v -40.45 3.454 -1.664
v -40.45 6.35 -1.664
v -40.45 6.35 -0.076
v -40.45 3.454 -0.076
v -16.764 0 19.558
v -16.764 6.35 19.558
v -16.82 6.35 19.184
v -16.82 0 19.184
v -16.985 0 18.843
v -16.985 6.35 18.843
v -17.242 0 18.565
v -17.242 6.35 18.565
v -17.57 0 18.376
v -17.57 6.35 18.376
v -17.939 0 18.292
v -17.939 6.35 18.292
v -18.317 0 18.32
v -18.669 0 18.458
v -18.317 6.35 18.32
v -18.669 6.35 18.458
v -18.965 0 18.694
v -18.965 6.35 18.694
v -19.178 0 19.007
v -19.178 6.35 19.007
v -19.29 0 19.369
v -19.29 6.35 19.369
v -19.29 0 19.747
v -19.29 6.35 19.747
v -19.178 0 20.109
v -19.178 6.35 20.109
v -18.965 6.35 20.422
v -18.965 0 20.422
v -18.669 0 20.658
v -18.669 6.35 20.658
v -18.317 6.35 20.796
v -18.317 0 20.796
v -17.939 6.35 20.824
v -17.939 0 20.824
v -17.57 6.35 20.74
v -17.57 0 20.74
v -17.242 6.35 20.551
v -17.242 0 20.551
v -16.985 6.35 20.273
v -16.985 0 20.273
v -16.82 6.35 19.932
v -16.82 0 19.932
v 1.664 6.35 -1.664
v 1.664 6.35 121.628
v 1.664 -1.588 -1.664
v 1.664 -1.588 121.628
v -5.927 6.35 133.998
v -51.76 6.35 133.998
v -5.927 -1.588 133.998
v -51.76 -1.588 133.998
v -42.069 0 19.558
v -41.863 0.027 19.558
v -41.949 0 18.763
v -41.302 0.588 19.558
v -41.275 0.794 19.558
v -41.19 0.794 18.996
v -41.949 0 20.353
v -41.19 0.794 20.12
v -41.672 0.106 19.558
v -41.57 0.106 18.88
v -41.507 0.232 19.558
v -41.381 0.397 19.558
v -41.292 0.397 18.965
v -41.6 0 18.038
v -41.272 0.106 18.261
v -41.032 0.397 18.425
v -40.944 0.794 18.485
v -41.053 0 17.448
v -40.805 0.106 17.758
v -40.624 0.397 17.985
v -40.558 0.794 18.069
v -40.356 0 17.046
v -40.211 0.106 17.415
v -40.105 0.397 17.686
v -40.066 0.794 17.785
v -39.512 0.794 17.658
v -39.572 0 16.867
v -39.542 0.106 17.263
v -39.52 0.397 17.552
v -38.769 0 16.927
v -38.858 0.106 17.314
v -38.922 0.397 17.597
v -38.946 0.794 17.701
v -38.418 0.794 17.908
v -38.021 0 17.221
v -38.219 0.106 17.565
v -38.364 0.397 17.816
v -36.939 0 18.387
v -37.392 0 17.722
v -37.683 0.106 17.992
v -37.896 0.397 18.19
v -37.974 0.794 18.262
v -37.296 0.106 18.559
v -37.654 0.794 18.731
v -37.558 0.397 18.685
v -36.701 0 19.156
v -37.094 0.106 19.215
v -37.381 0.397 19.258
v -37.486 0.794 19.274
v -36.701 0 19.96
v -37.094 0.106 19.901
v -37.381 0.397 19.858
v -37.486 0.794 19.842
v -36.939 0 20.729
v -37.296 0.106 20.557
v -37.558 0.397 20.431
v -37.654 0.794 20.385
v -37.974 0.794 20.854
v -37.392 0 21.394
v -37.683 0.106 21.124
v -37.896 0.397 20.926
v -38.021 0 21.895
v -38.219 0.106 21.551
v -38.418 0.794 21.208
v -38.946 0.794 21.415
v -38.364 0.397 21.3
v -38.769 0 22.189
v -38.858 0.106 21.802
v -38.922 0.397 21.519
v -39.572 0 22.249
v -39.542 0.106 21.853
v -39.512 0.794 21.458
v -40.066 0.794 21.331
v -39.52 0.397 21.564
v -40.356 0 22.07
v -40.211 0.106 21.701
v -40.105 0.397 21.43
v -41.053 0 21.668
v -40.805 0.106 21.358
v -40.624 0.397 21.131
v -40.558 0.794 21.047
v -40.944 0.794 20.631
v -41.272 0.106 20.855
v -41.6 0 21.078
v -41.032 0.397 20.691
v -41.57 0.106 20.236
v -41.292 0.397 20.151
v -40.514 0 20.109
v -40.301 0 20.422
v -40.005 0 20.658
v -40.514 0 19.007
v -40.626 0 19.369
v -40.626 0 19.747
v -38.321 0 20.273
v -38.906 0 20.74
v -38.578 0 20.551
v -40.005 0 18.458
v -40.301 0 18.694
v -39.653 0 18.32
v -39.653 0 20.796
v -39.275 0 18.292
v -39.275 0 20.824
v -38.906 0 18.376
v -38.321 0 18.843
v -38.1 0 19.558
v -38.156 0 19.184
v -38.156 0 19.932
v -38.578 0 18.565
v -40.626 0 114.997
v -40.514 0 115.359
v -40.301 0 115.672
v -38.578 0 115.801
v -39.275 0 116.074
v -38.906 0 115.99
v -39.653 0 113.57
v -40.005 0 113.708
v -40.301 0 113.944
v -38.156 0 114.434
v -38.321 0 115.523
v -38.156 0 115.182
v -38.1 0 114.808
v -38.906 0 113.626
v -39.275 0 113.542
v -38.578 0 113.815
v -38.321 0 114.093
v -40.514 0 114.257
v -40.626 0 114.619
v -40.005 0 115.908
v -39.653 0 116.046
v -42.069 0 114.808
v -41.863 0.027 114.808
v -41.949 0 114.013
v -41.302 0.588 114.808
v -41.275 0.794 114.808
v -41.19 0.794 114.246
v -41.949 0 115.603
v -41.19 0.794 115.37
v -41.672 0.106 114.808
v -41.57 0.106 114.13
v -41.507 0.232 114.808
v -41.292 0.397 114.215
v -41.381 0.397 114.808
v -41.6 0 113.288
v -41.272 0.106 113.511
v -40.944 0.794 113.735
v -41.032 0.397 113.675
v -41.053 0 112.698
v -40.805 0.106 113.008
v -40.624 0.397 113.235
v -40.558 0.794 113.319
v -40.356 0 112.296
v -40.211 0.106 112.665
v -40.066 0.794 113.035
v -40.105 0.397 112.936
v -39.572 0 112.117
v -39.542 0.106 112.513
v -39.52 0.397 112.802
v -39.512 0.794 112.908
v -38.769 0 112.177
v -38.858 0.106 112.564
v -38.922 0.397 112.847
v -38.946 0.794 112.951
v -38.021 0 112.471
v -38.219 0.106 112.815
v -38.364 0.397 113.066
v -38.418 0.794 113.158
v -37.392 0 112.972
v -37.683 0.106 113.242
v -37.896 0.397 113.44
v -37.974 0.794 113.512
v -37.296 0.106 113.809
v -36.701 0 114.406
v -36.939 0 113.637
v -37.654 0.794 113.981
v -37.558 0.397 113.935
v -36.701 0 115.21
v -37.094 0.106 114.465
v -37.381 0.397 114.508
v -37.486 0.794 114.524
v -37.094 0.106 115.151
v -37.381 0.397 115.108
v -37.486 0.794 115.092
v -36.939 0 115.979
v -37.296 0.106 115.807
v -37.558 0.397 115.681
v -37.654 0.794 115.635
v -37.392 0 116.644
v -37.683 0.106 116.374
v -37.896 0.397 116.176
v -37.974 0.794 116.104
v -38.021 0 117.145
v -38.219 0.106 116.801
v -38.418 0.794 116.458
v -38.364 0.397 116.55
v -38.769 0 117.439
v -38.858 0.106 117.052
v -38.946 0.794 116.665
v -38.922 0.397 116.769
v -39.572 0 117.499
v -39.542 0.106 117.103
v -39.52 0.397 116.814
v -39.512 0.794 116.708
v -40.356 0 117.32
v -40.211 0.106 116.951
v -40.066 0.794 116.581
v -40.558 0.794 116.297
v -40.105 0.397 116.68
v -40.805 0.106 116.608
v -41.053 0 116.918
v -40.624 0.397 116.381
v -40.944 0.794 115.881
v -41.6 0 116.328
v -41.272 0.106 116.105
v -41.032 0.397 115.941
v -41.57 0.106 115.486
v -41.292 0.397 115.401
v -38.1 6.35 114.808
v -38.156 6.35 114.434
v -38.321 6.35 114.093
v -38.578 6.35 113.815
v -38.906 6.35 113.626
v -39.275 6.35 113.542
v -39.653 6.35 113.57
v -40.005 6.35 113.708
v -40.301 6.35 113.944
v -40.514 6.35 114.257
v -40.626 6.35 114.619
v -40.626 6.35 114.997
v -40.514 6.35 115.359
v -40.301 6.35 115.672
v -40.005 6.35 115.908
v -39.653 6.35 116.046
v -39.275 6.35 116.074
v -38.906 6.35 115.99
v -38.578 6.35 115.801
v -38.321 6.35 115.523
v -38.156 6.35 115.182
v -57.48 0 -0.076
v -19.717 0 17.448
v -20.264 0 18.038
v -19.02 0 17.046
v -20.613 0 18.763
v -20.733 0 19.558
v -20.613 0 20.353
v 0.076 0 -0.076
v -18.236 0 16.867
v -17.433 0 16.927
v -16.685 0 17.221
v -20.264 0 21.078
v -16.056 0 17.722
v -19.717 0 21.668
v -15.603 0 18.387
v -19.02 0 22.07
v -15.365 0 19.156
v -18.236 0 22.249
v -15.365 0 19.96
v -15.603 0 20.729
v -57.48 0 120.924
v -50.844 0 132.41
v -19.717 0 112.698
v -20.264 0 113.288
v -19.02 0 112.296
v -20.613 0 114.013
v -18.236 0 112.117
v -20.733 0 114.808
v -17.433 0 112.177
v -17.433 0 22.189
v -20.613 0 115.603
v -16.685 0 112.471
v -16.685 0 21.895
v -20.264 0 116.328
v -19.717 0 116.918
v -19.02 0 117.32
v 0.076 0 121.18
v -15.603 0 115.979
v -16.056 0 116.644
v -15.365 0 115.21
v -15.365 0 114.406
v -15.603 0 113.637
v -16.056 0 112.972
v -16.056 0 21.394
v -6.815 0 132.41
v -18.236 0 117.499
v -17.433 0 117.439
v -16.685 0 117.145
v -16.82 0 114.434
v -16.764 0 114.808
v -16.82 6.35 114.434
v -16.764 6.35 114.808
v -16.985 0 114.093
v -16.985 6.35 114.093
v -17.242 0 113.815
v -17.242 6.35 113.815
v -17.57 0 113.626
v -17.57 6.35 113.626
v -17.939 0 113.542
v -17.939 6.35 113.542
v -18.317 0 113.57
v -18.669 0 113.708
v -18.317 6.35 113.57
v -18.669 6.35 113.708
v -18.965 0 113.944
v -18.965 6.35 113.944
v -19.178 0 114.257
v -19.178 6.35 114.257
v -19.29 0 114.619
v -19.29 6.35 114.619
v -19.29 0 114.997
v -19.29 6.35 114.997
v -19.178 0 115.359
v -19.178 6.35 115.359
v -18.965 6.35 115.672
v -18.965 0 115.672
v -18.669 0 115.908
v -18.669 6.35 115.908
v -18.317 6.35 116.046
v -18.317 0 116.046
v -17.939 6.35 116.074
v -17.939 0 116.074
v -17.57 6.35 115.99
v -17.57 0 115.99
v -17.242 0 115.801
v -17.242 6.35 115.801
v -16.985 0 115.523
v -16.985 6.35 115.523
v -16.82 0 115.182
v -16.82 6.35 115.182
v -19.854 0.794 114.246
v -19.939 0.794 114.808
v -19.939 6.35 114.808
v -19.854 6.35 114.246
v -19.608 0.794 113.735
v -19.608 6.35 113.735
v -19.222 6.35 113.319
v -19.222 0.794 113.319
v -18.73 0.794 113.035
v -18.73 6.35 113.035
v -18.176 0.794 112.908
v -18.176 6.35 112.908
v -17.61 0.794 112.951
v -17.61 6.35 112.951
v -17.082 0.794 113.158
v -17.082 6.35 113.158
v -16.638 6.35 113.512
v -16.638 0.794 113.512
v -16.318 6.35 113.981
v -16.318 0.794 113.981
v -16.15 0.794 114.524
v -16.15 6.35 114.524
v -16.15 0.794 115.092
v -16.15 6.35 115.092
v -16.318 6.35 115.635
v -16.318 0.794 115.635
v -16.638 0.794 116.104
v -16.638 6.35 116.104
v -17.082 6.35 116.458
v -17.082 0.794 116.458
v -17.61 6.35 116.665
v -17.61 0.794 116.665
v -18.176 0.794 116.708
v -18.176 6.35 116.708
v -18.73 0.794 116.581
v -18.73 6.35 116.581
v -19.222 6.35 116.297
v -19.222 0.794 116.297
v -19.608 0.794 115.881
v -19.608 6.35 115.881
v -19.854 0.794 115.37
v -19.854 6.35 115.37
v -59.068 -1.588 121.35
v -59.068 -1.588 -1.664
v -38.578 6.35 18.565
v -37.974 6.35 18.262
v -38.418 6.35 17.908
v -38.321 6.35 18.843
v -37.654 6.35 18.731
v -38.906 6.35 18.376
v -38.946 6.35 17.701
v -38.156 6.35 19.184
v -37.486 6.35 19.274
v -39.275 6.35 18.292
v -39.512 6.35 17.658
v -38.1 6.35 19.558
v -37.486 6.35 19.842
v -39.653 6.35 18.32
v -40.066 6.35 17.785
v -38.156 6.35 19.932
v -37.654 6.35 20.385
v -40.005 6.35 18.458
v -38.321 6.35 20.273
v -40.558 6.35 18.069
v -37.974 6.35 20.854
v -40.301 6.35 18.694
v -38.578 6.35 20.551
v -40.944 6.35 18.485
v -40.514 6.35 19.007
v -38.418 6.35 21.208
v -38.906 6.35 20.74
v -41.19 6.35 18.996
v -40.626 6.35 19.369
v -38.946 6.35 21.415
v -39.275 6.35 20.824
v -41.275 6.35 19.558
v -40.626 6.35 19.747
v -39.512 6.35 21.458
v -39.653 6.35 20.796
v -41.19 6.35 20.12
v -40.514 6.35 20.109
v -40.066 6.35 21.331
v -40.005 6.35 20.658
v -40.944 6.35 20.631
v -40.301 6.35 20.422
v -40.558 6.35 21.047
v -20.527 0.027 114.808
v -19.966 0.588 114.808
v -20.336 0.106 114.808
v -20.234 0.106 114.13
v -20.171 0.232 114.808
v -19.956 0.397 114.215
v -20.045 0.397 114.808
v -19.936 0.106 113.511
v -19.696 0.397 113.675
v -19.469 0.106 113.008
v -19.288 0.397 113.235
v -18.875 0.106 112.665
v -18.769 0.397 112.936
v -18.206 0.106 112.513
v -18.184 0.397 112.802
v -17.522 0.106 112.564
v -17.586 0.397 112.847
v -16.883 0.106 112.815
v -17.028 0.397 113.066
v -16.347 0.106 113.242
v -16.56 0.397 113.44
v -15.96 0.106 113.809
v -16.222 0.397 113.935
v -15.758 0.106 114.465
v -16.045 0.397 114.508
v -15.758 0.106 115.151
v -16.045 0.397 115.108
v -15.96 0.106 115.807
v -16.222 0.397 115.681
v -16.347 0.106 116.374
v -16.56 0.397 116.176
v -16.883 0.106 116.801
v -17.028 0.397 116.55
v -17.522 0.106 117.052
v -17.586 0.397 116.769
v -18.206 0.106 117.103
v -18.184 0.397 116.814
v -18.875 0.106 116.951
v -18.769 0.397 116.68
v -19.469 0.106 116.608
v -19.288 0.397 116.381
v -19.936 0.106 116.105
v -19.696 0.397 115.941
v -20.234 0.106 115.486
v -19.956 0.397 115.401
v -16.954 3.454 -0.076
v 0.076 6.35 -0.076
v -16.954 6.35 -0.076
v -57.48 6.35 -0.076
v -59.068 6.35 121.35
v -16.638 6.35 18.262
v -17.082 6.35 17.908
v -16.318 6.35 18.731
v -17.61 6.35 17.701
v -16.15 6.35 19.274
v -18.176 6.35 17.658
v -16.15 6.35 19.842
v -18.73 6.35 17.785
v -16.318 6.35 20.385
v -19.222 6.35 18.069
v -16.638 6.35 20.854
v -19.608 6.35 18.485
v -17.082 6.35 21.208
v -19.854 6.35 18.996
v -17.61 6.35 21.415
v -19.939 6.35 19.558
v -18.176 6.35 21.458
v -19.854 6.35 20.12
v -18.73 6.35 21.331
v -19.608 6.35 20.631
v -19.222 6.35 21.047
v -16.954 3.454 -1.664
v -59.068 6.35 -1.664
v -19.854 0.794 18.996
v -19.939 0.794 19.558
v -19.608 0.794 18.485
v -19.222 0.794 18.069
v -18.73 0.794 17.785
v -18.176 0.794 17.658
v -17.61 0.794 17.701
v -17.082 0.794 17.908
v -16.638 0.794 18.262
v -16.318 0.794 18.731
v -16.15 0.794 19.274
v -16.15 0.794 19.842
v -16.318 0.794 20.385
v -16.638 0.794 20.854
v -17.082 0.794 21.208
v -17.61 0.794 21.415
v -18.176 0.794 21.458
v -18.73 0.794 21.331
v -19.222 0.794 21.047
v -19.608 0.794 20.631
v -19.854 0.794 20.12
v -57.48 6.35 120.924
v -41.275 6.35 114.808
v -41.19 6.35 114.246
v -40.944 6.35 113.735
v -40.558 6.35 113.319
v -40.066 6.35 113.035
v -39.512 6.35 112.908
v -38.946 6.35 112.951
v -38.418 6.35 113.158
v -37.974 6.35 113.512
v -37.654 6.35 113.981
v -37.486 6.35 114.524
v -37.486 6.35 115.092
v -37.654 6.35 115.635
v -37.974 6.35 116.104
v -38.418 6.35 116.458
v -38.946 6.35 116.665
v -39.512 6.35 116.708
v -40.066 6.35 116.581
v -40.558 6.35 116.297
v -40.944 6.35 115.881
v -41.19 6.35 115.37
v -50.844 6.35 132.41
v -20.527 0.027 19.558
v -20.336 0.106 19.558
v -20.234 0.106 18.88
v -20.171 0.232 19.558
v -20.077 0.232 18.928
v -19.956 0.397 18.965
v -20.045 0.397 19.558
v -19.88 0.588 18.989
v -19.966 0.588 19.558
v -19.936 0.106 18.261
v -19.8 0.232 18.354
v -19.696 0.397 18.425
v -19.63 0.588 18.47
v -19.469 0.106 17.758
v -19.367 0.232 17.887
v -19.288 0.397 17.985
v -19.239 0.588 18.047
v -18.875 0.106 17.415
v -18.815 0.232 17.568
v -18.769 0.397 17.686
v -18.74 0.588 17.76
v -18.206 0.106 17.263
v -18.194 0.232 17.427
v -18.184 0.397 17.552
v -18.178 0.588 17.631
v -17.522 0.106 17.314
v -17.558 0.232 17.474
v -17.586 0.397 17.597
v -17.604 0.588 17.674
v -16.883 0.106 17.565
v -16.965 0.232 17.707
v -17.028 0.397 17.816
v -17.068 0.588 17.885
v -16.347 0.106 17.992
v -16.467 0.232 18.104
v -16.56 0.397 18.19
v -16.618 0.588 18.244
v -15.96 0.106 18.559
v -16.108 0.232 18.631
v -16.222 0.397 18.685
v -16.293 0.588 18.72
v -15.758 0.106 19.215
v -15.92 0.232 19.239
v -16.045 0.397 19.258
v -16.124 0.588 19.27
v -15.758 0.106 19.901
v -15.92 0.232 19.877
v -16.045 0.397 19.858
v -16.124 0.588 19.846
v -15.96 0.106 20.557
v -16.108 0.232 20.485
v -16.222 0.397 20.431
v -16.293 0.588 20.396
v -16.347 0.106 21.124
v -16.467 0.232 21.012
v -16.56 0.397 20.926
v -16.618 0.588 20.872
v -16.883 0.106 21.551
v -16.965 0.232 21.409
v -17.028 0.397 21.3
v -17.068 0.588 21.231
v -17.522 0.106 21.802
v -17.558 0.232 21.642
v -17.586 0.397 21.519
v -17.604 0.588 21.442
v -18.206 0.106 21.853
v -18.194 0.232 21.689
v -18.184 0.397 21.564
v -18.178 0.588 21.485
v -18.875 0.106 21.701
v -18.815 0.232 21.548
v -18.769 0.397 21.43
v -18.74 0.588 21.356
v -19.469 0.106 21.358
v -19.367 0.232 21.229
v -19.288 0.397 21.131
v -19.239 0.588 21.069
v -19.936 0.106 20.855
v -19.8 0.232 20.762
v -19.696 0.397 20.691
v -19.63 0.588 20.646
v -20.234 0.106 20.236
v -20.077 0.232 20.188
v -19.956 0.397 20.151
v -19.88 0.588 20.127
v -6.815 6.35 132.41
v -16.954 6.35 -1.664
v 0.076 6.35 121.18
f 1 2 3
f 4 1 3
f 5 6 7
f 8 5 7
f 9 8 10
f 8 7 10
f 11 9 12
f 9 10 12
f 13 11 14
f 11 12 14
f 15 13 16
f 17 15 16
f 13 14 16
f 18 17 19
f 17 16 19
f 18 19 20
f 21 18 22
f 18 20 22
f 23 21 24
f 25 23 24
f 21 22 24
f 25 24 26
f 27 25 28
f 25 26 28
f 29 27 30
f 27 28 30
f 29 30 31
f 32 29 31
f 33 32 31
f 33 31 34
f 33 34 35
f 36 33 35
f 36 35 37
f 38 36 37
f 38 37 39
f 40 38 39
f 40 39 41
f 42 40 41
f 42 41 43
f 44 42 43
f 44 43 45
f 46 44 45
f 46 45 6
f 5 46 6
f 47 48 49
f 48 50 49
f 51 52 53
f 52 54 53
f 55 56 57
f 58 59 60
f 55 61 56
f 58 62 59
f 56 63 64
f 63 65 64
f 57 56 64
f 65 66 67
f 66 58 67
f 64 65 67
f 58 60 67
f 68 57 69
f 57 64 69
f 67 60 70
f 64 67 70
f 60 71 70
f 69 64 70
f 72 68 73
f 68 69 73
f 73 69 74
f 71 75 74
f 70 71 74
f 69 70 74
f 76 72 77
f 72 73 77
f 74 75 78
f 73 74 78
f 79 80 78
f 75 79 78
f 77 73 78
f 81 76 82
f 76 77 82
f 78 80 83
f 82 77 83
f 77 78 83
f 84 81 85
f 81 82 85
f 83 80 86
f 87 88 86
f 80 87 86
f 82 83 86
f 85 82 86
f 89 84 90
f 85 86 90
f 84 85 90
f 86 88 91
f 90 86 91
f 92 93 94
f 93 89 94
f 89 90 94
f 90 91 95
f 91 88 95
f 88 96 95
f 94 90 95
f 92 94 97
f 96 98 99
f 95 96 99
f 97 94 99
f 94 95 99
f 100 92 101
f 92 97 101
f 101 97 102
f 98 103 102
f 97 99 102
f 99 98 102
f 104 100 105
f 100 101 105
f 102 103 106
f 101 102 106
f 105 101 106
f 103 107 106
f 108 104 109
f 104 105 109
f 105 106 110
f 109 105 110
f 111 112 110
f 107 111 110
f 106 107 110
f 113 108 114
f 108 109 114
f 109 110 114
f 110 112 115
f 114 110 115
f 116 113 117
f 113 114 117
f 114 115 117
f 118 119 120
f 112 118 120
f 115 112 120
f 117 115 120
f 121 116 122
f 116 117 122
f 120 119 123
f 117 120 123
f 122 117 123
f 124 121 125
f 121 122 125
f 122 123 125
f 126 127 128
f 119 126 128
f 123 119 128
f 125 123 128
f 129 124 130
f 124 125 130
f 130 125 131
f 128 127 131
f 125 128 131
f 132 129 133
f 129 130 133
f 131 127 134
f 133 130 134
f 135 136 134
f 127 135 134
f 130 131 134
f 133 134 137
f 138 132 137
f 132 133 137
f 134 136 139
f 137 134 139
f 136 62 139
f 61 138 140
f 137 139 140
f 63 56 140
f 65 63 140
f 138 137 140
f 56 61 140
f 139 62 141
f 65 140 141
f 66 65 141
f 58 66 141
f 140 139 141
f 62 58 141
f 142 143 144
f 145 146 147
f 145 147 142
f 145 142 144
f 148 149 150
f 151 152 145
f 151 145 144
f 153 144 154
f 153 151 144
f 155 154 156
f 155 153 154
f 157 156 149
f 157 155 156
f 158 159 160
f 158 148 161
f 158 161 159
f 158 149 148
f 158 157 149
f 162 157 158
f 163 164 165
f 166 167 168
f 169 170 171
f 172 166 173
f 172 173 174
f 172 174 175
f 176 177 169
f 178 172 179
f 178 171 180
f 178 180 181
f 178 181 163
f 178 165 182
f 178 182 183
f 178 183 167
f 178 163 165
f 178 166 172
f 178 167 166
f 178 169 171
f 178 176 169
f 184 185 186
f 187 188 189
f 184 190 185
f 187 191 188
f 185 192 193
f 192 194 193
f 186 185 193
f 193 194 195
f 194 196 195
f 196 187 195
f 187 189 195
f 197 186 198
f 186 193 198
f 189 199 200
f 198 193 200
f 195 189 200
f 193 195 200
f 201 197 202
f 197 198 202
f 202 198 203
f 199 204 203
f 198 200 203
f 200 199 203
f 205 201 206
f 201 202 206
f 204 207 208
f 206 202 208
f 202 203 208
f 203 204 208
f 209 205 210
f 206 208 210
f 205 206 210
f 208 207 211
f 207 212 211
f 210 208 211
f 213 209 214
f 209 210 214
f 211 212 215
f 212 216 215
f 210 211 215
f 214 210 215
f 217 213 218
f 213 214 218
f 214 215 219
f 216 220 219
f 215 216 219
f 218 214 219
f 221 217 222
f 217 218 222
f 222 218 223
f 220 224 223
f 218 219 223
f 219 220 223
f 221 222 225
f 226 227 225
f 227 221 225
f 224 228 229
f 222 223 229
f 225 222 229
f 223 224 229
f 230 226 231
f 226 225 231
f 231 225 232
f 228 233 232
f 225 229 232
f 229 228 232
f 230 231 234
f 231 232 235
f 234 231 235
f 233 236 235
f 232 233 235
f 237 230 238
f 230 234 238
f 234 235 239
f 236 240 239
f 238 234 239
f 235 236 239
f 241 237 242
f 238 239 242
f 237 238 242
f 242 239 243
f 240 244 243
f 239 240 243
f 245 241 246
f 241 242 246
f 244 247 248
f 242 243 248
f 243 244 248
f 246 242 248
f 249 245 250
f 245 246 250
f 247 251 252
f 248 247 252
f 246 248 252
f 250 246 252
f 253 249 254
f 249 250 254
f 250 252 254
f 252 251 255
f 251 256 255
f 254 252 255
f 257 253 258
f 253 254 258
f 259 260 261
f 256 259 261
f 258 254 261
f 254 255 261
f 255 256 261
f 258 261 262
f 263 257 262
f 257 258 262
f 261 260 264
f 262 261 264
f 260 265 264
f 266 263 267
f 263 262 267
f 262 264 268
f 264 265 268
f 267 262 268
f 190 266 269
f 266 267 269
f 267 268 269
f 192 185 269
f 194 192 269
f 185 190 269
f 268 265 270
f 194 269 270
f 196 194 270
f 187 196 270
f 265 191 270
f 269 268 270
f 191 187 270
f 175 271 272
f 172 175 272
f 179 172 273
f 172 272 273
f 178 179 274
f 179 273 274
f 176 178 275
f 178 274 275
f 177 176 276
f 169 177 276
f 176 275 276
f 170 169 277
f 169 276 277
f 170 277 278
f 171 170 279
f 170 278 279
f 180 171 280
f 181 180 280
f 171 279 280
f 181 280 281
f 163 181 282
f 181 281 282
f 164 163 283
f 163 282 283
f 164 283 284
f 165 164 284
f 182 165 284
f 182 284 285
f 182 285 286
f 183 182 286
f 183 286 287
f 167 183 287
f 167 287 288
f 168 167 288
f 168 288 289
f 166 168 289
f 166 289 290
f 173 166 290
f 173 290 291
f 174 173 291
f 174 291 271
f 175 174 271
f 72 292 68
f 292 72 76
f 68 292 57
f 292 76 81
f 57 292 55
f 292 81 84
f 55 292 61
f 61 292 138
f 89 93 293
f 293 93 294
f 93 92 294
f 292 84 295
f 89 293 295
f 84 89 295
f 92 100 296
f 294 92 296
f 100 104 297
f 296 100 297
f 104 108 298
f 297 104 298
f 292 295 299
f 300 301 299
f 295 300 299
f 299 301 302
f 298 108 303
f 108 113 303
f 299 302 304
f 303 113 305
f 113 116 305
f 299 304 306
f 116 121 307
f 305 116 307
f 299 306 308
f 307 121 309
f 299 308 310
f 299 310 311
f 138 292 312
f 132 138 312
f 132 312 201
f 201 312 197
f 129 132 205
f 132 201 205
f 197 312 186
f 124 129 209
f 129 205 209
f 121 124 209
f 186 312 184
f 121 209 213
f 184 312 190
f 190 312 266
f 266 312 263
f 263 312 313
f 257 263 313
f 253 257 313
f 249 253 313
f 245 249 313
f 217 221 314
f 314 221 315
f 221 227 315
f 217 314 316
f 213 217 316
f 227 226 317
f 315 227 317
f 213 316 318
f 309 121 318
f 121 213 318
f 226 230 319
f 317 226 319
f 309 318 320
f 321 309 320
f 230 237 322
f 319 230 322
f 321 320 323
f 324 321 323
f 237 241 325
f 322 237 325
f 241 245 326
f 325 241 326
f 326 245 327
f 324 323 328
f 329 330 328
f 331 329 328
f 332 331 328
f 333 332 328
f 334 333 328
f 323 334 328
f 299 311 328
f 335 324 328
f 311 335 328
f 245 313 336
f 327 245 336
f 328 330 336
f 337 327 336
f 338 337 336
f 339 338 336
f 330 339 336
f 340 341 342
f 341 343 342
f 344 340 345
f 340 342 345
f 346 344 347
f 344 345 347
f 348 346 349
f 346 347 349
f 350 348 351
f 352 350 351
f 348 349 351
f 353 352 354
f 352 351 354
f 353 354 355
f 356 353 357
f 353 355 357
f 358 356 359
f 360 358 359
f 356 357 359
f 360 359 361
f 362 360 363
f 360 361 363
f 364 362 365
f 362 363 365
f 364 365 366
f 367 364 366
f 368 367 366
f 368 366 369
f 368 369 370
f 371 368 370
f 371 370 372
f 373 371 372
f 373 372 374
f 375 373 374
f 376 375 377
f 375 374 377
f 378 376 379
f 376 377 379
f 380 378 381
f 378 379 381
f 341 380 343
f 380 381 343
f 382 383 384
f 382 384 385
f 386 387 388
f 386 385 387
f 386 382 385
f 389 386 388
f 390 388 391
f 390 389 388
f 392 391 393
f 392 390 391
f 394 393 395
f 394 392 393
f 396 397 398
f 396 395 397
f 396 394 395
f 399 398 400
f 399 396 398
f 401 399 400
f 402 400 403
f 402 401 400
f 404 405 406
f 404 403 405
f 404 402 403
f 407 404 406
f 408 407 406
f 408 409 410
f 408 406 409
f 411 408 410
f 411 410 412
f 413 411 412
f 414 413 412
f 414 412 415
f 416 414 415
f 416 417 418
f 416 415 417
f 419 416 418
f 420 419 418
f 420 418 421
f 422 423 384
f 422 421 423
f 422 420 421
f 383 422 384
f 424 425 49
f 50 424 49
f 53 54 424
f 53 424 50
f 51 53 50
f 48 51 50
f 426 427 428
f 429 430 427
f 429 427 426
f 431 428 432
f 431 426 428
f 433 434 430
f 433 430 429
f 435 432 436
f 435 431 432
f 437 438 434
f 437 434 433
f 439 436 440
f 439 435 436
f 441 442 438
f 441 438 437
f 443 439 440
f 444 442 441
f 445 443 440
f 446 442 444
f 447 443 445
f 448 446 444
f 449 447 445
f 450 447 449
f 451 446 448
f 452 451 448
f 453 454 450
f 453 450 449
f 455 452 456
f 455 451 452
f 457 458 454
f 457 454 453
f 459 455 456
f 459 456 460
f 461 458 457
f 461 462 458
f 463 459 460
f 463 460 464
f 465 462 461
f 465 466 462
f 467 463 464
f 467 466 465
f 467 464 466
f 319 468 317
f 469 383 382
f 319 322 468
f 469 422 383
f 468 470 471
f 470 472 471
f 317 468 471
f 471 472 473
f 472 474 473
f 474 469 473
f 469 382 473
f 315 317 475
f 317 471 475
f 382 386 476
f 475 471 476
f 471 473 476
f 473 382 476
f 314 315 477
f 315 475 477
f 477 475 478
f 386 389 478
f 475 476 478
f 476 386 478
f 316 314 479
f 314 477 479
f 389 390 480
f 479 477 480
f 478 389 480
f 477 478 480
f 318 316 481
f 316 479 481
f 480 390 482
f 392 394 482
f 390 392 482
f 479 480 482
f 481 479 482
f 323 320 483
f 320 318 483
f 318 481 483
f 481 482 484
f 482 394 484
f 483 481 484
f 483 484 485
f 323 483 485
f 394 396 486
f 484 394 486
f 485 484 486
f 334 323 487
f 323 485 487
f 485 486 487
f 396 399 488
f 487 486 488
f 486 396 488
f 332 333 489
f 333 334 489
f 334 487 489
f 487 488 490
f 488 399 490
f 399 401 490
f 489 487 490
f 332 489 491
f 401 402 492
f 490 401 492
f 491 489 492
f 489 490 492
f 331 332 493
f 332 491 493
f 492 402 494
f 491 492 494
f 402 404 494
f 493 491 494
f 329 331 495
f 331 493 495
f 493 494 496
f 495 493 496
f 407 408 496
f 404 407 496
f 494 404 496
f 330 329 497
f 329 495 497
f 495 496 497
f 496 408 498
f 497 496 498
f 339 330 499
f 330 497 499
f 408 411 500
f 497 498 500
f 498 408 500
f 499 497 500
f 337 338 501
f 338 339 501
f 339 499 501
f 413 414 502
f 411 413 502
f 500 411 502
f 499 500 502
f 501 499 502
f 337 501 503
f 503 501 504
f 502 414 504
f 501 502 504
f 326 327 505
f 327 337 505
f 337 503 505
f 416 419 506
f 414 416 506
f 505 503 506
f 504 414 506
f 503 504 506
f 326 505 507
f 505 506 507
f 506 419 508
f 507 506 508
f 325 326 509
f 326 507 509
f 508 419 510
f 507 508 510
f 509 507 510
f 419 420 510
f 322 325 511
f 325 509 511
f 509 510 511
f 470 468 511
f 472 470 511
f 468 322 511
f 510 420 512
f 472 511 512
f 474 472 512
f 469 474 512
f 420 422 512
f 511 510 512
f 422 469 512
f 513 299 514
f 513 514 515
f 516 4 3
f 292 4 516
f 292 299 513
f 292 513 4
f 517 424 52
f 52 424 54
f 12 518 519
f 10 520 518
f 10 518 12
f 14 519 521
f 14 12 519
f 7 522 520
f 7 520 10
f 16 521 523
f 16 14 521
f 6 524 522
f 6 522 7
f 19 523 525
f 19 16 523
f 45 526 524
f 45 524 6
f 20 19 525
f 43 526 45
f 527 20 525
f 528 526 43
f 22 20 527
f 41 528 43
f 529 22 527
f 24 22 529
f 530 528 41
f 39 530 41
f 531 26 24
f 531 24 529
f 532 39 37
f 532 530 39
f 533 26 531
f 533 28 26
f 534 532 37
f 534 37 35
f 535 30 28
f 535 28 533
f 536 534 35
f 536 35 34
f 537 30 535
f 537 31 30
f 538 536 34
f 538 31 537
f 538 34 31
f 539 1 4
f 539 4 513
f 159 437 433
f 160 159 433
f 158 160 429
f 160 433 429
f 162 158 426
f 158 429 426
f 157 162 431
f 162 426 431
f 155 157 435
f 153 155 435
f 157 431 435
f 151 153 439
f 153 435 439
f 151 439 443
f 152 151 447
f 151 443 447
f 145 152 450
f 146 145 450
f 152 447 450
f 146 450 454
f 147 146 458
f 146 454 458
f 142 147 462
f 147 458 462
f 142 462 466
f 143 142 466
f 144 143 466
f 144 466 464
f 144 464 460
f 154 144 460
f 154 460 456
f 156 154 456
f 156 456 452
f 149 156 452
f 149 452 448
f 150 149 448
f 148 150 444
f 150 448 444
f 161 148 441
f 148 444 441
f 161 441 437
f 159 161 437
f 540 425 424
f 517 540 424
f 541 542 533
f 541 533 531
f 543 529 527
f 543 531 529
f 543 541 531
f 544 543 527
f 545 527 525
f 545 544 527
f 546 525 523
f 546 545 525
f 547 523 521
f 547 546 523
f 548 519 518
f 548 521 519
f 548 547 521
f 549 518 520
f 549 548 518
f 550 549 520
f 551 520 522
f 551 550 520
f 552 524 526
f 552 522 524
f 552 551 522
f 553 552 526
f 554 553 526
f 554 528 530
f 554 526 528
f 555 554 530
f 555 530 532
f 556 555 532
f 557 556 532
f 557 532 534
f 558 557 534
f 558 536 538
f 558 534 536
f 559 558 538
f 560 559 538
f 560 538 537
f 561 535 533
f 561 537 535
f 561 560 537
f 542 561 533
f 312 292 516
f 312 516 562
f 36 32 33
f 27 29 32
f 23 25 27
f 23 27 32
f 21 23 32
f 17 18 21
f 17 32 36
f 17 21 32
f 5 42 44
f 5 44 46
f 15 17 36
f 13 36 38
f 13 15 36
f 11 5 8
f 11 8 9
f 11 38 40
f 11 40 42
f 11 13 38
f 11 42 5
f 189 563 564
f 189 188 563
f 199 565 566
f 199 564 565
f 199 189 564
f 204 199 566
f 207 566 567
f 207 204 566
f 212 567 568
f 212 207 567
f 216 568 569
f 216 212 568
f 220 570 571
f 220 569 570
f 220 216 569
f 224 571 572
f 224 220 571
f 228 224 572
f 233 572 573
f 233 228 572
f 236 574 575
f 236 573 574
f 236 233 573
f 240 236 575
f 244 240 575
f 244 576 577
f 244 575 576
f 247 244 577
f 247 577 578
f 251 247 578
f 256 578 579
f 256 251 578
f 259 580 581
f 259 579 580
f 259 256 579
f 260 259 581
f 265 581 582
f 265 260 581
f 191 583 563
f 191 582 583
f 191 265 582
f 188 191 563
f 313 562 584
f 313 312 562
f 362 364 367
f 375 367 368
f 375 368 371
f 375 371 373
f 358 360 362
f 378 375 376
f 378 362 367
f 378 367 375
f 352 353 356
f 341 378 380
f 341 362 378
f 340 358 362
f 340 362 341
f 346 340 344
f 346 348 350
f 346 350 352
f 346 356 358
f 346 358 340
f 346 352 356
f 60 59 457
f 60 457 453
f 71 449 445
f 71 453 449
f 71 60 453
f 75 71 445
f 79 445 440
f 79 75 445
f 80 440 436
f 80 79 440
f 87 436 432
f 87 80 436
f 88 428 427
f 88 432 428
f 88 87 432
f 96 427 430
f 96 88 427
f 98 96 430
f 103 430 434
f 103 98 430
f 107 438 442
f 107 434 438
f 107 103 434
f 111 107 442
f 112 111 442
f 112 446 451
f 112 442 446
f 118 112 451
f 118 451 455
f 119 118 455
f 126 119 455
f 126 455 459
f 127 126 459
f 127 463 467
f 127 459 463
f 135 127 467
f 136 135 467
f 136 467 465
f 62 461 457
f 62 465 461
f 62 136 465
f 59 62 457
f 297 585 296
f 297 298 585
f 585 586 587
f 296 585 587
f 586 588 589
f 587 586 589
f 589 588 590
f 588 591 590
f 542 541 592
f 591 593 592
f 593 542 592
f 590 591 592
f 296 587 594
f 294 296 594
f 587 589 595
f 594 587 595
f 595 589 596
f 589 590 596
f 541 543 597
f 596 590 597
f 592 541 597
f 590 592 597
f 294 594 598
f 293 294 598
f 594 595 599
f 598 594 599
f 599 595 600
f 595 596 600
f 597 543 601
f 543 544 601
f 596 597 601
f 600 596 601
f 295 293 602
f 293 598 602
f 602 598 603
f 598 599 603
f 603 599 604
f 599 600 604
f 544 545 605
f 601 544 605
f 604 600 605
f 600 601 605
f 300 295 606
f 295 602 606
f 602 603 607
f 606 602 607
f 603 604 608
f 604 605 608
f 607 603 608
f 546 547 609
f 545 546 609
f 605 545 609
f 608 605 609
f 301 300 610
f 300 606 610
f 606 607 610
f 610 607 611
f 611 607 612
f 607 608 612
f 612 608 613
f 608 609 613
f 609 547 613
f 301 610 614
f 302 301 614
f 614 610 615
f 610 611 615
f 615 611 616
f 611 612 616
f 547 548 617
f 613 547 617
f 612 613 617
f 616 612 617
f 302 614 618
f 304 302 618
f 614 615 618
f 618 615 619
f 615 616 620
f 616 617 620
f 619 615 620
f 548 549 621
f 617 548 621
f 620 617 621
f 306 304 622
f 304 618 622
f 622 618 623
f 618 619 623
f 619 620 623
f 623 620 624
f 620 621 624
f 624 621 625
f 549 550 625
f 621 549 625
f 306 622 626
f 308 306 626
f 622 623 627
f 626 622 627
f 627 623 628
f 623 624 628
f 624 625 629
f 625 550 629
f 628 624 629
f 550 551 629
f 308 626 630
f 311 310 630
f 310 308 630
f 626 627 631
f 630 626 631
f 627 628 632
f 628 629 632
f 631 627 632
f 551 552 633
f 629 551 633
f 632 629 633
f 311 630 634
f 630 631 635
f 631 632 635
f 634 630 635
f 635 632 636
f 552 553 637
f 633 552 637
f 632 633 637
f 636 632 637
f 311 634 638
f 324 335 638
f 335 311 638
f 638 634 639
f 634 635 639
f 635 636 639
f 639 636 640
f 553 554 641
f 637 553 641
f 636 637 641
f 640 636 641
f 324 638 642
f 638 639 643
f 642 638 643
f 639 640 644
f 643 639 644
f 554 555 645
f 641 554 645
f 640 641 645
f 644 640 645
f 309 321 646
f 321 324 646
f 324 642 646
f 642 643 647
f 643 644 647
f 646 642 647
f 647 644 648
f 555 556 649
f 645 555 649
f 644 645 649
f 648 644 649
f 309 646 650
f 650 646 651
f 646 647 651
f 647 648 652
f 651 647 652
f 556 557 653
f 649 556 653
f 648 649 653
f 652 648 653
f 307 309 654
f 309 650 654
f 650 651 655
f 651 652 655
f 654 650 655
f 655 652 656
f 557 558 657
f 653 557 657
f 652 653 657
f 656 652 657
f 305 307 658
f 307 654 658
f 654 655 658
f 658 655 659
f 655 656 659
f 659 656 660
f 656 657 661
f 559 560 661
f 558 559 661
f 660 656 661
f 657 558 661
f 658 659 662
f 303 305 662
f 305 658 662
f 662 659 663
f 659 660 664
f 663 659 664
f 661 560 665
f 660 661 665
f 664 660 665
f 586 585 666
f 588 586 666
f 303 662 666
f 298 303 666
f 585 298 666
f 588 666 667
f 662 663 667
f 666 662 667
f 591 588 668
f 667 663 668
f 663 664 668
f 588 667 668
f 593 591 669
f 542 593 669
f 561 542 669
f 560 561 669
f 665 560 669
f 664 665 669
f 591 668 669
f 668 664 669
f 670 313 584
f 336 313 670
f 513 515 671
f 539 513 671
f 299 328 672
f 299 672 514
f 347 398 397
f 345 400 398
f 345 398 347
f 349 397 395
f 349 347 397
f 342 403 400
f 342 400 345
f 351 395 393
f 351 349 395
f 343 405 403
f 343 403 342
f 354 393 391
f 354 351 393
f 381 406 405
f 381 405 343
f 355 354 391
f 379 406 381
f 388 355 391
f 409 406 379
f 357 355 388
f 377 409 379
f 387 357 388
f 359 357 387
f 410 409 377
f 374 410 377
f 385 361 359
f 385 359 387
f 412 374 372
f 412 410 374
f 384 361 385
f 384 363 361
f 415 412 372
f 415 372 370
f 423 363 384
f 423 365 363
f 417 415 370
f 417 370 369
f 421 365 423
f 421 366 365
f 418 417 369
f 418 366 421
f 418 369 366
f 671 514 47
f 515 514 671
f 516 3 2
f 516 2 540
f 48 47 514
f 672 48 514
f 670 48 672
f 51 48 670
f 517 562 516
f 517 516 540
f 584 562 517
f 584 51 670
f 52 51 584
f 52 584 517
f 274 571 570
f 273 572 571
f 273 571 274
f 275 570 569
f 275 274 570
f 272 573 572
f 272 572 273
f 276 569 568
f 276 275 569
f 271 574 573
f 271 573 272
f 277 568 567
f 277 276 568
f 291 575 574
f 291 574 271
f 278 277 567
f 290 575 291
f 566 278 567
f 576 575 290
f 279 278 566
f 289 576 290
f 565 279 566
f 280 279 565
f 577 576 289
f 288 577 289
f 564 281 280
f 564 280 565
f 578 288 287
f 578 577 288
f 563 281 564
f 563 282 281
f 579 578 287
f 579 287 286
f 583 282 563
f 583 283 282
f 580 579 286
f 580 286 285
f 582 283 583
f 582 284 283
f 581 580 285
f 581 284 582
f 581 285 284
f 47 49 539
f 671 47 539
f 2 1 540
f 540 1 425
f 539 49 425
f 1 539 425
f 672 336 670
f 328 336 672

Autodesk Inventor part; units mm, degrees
ref_plane "YZ Plane" through (0, 0, 0) normal (1, 0, 0) x (0, 1, 0)
ref_plane "XZ Plane" through (0, 0, 0) normal (0, 1, 0) x (-1, 0, 0)
ref_plane "XY Plane" through (0, 0, 0) normal (0, 0, 1) x (1, 0, 0)
sketch "Sketch1" plane through (0, 0, 0) normal (0, 1, 0) x (-1, 0, 0)
  line L0 (0, 0) -> (57.404, 0) construction
  line L1 (57.404, 0) -> (57.404, 120.904) construction
  line L2 (57.404, 120.904) -> (50.8, 132.334) construction
  line L3 (50.8, 132.334) -> (6.858, 132.334) construction
  line L4 (6.858, 132.334) -> (0, 121.158) construction
  line L5 (0, 121.158) -> (0, 0) construction
  circle A0 centre (4.318, 10.414) radius 0.51 construction
  circle A1 centre (4.318, 17.526) radius 0.51 construction
  circle A2 centre (4.318, 15.366) radius 0.55 construction
  circle A3 centre (4.318, 24.638) radius 0.51 construction
  circle A4 centre (4.318, 22.478) radius 0.55 construction
  circle A5 centre (6.858, 3.302) radius 0.51 construction
  circle A6 centre (6.858, 10.414) radius 0.51 construction
  circle A7 centre (6.858, 17.526) radius 0.51 construction
  circle A8 centre (4.318, 3.302) radius 0.51 construction
  circle A9 centre (4.318, 8.254) radius 0.55 construction
  circle A10 centre (18.542, 10.879) radius 1.27 construction
  circle A11 centre (9.398, 10.414) radius 0.51 construction
  circle A12 centre (9.398, 17.526) radius 0.51 construction
  circle A13 centre (18.034, 19.558) radius 2.15 construction
  circle A14 centre (9.398, 3.302) radius 0.51 construction
  circle A15 centre (23.622, 3.259) radius 1.995 construction
  circle A16 centre (21.082, 13.419) radius 0.8 construction
  circle A17 centre (26.162, 13.419) radius 0.8 construction
  circle A18 centre (53.086, 3.81) radius 0.51 construction
  circle A19 centre (48.006, 3.81) radius 0.51 construction
  circle A20 centre (50.546, 3.81) radius 0.51 construction
  circle A21 centre (53.086, 5.97) radius 0.55 construction
  circle A22 centre (50.546, 10.922) radius 0.51 construction
  circle A23 centre (53.086, 10.922) radius 0.51 construction
  circle A24 centre (48.006, 10.922) radius 0.51 construction
  circle A25 centre (48.006, 18.034) radius 0.51 construction
  circle A26 centre (50.546, 18.034) radius 0.51 construction
  circle A27 centre (53.086, 18.034) radius 0.51 construction
  circle A28 centre (53.086, 13.082) radius 0.55 construction
  circle A29 centre (31.242, 13.419) radius 0.8 construction
  circle A30 centre (36.322, 13.419) radius 0.8 construction
  circle A31 centre (33.782, 3.259) radius 1.995 construction
  circle A32 centre (39.37, 19.558) radius 2.15 construction
  circle A33 centre (38.862, 10.879) radius 1.27 construction
  circle A34 centre (53.086, 20.194) radius 0.55 construction
  circle A35 centre (21.082, 72.644) radius 0.5 construction
  circle A36 centre (21.082, 37.084) radius 0.5 construction
  circle A37 centre (36.322, 52.324) radius 0.5 construction
  circle A38 centre (48.006, 67.818) radius 0.51 construction
  circle A39 centre (55.626, 10.922) radius 0.51 construction
  circle A40 centre (55.626, 3.81) radius 0.51 construction
  circle A41 centre (55.626, 18.034) radius 0.51 construction
  circle A42 centre (1.778, 3.302) radius 0.51 construction
  circle A43 centre (1.778, 10.414) radius 0.51 construction
  circle A44 centre (1.778, 17.526) radius 0.51 construction
  circle A45 centre (1.778, 88.646) radius 0.51 construction
  circle A46 centre (4.318, 88.646) radius 0.51 construction
  circle A47 centre (9.398, 88.646) radius 0.51 construction
  circle A48 centre (6.858, 88.646) radius 0.51 construction
  circle A49 centre (21.082, 87.884) radius 0.5 construction
  circle A50 centre (55.626, 89.154) radius 0.51 construction
  circle A51 centre (53.086, 89.154) radius 0.51 construction
  circle A52 centre (50.546, 89.154) radius 0.51 construction
  circle A53 centre (48.006, 89.154) radius 0.51 construction
  circle A54 centre (36.322, 87.884) radius 0.5 construction
  circle A55 centre (53.086, 84.202) radius 0.55 construction
  circle A56 centre (36.322, 85.344) radius 0.5 construction
  circle A57 centre (4.318, 86.486) radius 0.55 construction
  circle A58 centre (21.082, 85.344) radius 0.5 construction
  circle A59 centre (9.398, 60.198) radius 0.51 construction
  circle A60 centre (21.082, 65.024) radius 0.5 construction
  circle A61 centre (21.082, 62.484) radius 0.5 construction
  circle A62 centre (21.082, 59.944) radius 0.5 construction
  circle A63 centre (9.398, 67.31) radius 0.51 construction
  circle A64 centre (21.082, 75.184) radius 0.5 construction
  circle A65 centre (21.082, 67.564) radius 0.5 construction
  circle A66 centre (21.082, 70.104) radius 0.5 construction
  circle A67 centre (9.398, 74.422) radius 0.51 construction
  circle A68 centre (21.082, 80.264) radius 0.5 construction
  circle A69 centre (21.082, 77.724) radius 0.5 construction
  circle A70 centre (21.082, 82.804) radius 0.5 construction
  circle A71 centre (9.398, 81.534) radius 0.51 construction
  circle A72 centre (50.546, 82.042) radius 0.51 construction
  circle A73 centre (48.006, 82.042) radius 0.51 construction
  circle A74 centre (36.322, 77.724) radius 0.5 construction
  circle A75 centre (36.322, 80.264) radius 0.5 construction
  circle A76 centre (36.322, 82.804) radius 0.5 construction
  circle A77 centre (50.546, 74.93) radius 0.51 construction
  circle A78 centre (48.006, 74.93) radius 0.51 construction
  circle A79 centre (36.322, 75.184) radius 0.5 construction
  circle A80 centre (36.322, 72.644) radius 0.5 construction
  circle A81 centre (36.322, 62.484) radius 0.5 construction
  circle A82 centre (36.322, 65.024) radius 0.5 construction
  circle A83 centre (36.322, 70.104) radius 0.5 construction
  circle A84 centre (36.322, 67.564) radius 0.5 construction
  circle A85 centre (50.546, 67.818) radius 0.51 construction
  circle A86 centre (50.546, 60.706) radius 0.51 construction
  circle A87 centre (48.006, 60.706) radius 0.51 construction
  circle A88 centre (36.322, 59.944) radius 0.5 construction
  circle A89 centre (4.318, 65.15) radius 0.55 construction
  circle A90 centre (4.318, 60.198) radius 0.51 construction
  circle A91 centre (4.318, 67.31) radius 0.51 construction
  circle A92 centre (6.858, 67.31) radius 0.51 construction
  circle A93 centre (6.858, 60.198) radius 0.51 construction
  circle A94 centre (6.858, 81.534) radius 0.51 construction
  circle A95 centre (6.858, 74.422) radius 0.51 construction
  circle A96 centre (4.318, 81.534) radius 0.51 construction
  circle A97 centre (4.318, 72.262) radius 0.55 construction
  circle A98 centre (4.318, 74.422) radius 0.51 construction
  circle A99 centre (4.318, 79.374) radius 0.55 construction
  circle A100 centre (53.086, 69.978) radius 0.55 construction
  circle A101 centre (53.086, 67.818) radius 0.51 construction
  circle A102 centre (53.086, 74.93) radius 0.51 construction
  circle A103 centre (53.086, 60.706) radius 0.51 construction
  circle A104 centre (53.086, 62.866) radius 0.55 construction
  circle A105 centre (53.086, 77.09) radius 0.55 construction
  circle A106 centre (53.086, 82.042) radius 0.51 construction
  circle A107 centre (1.778, 60.198) radius 0.51 construction
  circle A108 centre (1.778, 67.31) radius 0.51 construction
  circle A109 centre (1.778, 81.534) radius 0.51 construction
  circle A110 centre (1.778, 74.422) radius 0.51 construction
  circle A111 centre (55.626, 60.706) radius 0.51 construction
  circle A112 centre (55.626, 67.818) radius 0.51 construction
  circle A113 centre (55.626, 82.042) radius 0.51 construction
  circle A114 centre (55.626, 74.93) radius 0.51 construction
  circle A115 centre (36.322, 57.404) radius 0.5 construction
  circle A116 centre (21.082, 57.404) radius 0.5 construction
  circle A117 centre (4.318, 58.038) radius 0.55 construction
  circle A118 centre (1.778, 24.638) radius 0.51 construction
  circle A119 centre (1.778, 31.75) radius 0.51 construction
  circle A120 centre (4.318, 31.75) radius 0.51 construction
  circle A121 centre (4.318, 29.59) radius 0.55 construction
  circle A122 centre (6.858, 24.638) radius 0.51 construction
  circle A123 centre (6.858, 31.75) radius 0.51 construction
  circle A124 centre (6.858, 38.862) radius 0.51 construction
  circle A125 centre (4.318, 38.862) radius 0.51 construction
  circle A126 centre (1.778, 38.862) radius 0.51 construction
  circle A127 centre (4.318, 36.702) radius 0.55 construction
  circle A128 centre (9.398, 24.638) radius 0.51 construction
  circle A129 centre (21.082, 39.624) radius 0.5 construction
  circle A130 centre (21.082, 32.004) radius 0.5 construction
  circle A131 centre (21.082, 34.544) radius 0.5 construction
  circle A132 centre (9.398, 31.75) radius 0.51 construction
  circle A133 centre (9.398, 38.862) radius 0.51 construction
  circle A134 centre (1.778, 45.974) radius 0.51 construction
  circle A135 centre (6.858, 45.974) radius 0.51 construction
  circle A136 centre (4.318, 45.974) radius 0.51 construction
  circle A137 centre (4.318, 43.814) radius 0.55 construction
  circle A138 centre (9.398, 45.974) radius 0.51 construction
  circle A139 centre (21.082, 44.704) radius 0.5 construction
  circle A140 centre (21.082, 42.164) radius 0.5 construction
  circle A141 centre (21.082, 47.244) radius 0.5 construction
  circle A142 centre (55.626, 46.482) radius 0.51 construction
  circle A143 centre (53.086, 46.482) radius 0.51 construction
  circle A144 centre (50.546, 46.482) radius 0.51 construction
  circle A145 centre (55.626, 39.37) radius 0.51 construction
  circle A146 centre (53.086, 39.37) radius 0.51 construction
  circle A147 centre (50.546, 39.37) radius 0.51 construction
  circle A148 centre (53.086, 41.53) radius 0.55 construction
  circle A149 centre (48.006, 46.482) radius 0.51 construction
  circle A150 centre (48.006, 32.258) radius 0.51 construction
  circle A151 centre (50.546, 32.258) radius 0.51 construction
  circle A152 centre (55.626, 32.258) radius 0.51 construction
  circle A153 centre (53.086, 32.258) radius 0.51 construction
  circle A154 centre (48.006, 39.37) radius 0.51 construction
  circle A155 centre (53.086, 34.418) radius 0.55 construction
  circle A156 centre (53.086, 27.306) radius 0.55 construction
  circle A157 centre (36.322, 34.544) radius 0.5 construction
  circle A158 centre (36.322, 39.624) radius 0.5 construction
  circle A159 centre (36.322, 37.084) radius 0.5 construction
  circle A160 centre (36.322, 42.164) radius 0.5 construction
  circle A161 centre (36.322, 47.244) radius 0.5 construction
  circle A162 centre (36.322, 44.704) radius 0.5 construction
  circle A163 centre (36.322, 32.004) radius 0.5 construction
  circle A164 centre (55.626, 25.146) radius 0.51 construction
  circle A165 centre (53.086, 25.146) radius 0.51 construction
  circle A166 centre (48.006, 25.146) radius 0.51 construction
  circle A167 centre (50.546, 25.146) radius 0.51 construction
  circle A168 centre (36.322, 49.784) radius 0.5 construction
  circle A169 centre (21.082, 49.784) radius 0.5 construction
  circle A170 centre (53.086, 48.642) radius 0.55 construction
  circle A171 centre (4.318, 53.086) radius 0.51 construction
  circle A172 centre (4.318, 50.926) radius 0.55 construction
  circle A173 centre (6.858, 53.086) radius 0.51 construction
  circle A174 centre (9.398, 53.086) radius 0.51 construction
  circle A175 centre (21.082, 52.324) radius 0.5 construction
  circle A176 centre (55.626, 53.594) radius 0.51 construction
  circle A177 centre (53.086, 53.594) radius 0.51 construction
  circle A178 centre (48.006, 53.594) radius 0.51 construction
  circle A179 centre (50.546, 53.594) radius 0.51 construction
  circle A180 centre (1.778, 53.086) radius 0.51 construction
  circle A181 centre (53.086, 55.754) radius 0.55 construction
  circle A182 centre (36.322, 54.864) radius 0.5 construction
  circle A183 centre (21.082, 54.864) radius 0.5 construction
  circle A184 centre (55.626, 96.266) radius 0.51 construction
  circle A185 centre (53.086, 96.266) radius 0.51 construction
  circle A186 centre (53.086, 91.314) radius 0.55 construction
  circle A187 centre (50.546, 96.266) radius 0.51 construction
  circle A188 centre (48.006, 96.266) radius 0.51 construction
  circle A189 centre (36.322, 90.424) radius 0.5 construction
  circle A190 centre (6.858, 95.758) radius 0.51 construction
  circle A191 centre (9.398, 95.758) radius 0.51 construction
  circle A192 centre (21.082, 90.424) radius 0.5 construction
  circle A193 centre (4.318, 95.758) radius 0.51 construction
  circle A194 centre (4.318, 93.598) radius 0.55 construction
  circle A195 centre (1.778, 95.758) radius 0.51 construction
  circle A196 centre (55.626, 117.602) radius 0.51 construction
  circle A197 centre (53.086, 117.602) radius 0.51 construction
  circle A198 centre (48.006, 117.602) radius 0.51 construction
  circle A199 centre (50.546, 117.602) radius 0.51 construction
  circle A200 centre (53.086, 112.65) radius 0.55 construction
  circle A201 centre (53.086, 110.49) radius 0.51 construction
  circle A202 centre (48.006, 110.49) radius 0.51 construction
  circle A203 centre (50.546, 110.49) radius 0.51 construction
  circle A204 centre (55.626, 110.49) radius 0.51 construction
  circle A205 centre (39.37, 114.808) radius 2.15 construction
  circle A206 centre (9.398, 109.982) radius 0.51 construction
  circle A207 centre (9.398, 117.094) radius 0.51 construction
  circle A208 centre (18.034, 114.808) radius 2.15 construction
  circle A209 centre (9.398, 102.87) radius 0.51 construction
  circle A210 centre (53.086, 103.378) radius 0.51 construction
  circle A211 centre (48.006, 103.378) radius 0.51 construction
  circle A212 centre (50.546, 103.378) radius 0.51 construction
  circle A213 centre (53.086, 105.538) radius 0.55 construction
  circle A214 centre (55.626, 103.378) radius 0.51 construction
  circle A215 centre (4.318, 117.094) radius 0.51 construction
  circle A216 centre (4.318, 114.934) radius 0.55 construction
  circle A217 centre (6.858, 117.094) radius 0.51 construction
  circle A218 centre (4.318, 109.982) radius 0.51 construction
  circle A219 centre (6.858, 109.982) radius 0.51 construction
  circle A220 centre (6.858, 102.87) radius 0.51 construction
  circle A221 centre (4.318, 102.87) radius 0.51 construction
  circle A222 centre (4.318, 107.822) radius 0.55 construction
  circle A223 centre (4.318, 100.71) radius 0.55 construction
  circle A224 centre (1.778, 117.094) radius 0.51 construction
  circle A225 centre (1.778, 109.982) radius 0.51 construction
  circle A226 centre (1.778, 102.87) radius 0.51 construction
  circle A227 centre (53.086, 98.426) radius 0.55 construction
  circle A228 centre (10.16, 122.682) radius 0.51 construction
  circle A229 centre (17.272, 122.682) radius 0.51 construction
  circle A230 centre (24.384, 122.682) radius 0.51 construction
  circle A231 centre (38.608, 122.682) radius 0.51 construction
  circle A232 centre (31.496, 122.682) radius 0.51 construction
  circle A233 centre (53.086, 119.762) radius 0.55 construction
  circle A234 centre (45.72, 122.682) radius 0.51 construction
  circle A235 centre (24.384, 130.302) radius 0.51 construction
  circle A236 centre (17.272, 130.302) radius 0.51 construction
  circle A237 centre (22.224, 127.762) radius 0.55 construction
  circle A238 centre (17.272, 127.762) radius 0.51 construction
  circle A239 centre (31.496, 127.762) radius 0.51 construction
  circle A240 centre (29.336, 127.762) radius 0.55 construction
  circle A241 centre (24.384, 127.762) radius 0.51 construction
  circle A242 centre (31.496, 130.302) radius 0.51 construction
  circle A243 centre (17.272, 125.222) radius 0.51 construction
  circle A244 centre (24.384, 125.222) radius 0.51 construction
  circle A245 centre (31.496, 125.222) radius 0.51 construction
  circle A246 centre (38.608, 125.222) radius 0.51 construction
  circle A247 centre (36.448, 127.762) radius 0.55 construction
  circle A248 centre (38.608, 127.762) radius 0.51 construction
  circle A249 centre (38.608, 130.302) radius 0.51 construction
  circle A250 centre (45.72, 130.302) radius 0.51 construction
  circle A251 centre (45.72, 127.762) radius 0.51 construction
  circle A252 centre (43.56, 127.762) radius 0.55 construction
  circle A253 centre (45.72, 125.222) radius 0.51 construction
  circle A254 centre (10.16, 125.222) radius 0.51 construction
  circle A255 centre (10.16, 127.762) radius 0.51 construction
  circle A256 centre (10.16, 130.302) radius 0.51 construction
  circle A257 centre (15.112, 127.762) radius 0.55 construction
  circle A258 centre (8, 127.762) radius 0.55 construction
  circle A259 centre (4.318, 1.142) radius 0.55 construction
  line L6 (-0.0762, -0.0762) -> (57.4802, -0.0762)
  line L7 (57.4802, -0.0762) -> (57.4802, 120.9244)
  line L8 (57.4802, 120.9244) -> (50.844, 132.4102)
  line L9 (50.844, 132.4102) -> (6.8154, 132.4102)
  line L10 (6.8154, 132.4102) -> (-0.0762, 121.1795)
  line L11 (-0.0762, 121.1795) -> (-0.0762, -0.0762)
  line L12 (-1.6637, -1.6637) -> (59.0677, -1.6637)
  line L13 (59.0677, -1.6637) -> (59.0677, 121.3501)
  line L14 (59.0677, 121.3501) -> (51.7602, 133.9977)
  line L15 (51.7602, 133.9977) -> (5.9269, 133.9977)
  line L16 (5.9269, 133.9977) -> (-1.6637, 121.6278)
  line L17 (-1.6637, 121.6278) -> (-1.6637, -1.6637)
  circle A260 centre (39.37, 19.558) radius 1.905
  circle A261 centre (18.034, 19.558) radius 1.905
  circle A262 centre (18.034, 114.808) radius 1.905
  circle A263 centre (39.37, 114.808) radius 1.905
  point P0 (-98.298, 175.514)
  dimension "d0" = 0.0762
  dimension "d1" = 1.5875
  dimension "d6" = 3.81
extrude "Extrusion1" add sketch "Sketch1" along normal blind 6.35 contours L17 L16 L15 L14 L13 L12
sketch "Sketch2" plane through (0, 0, 0) normal (0, -1, 0) x (1, 0, 0)
  line L0 (-59.0677, -1.6637) -> (-59.0677, 121.3501) projected
  line L1 (1.6637, -1.6637) -> (-59.0677, -1.6637) projected
  line L2 (1.6637, 121.6278) -> (1.6637, -1.6637) projected
  line L3 (-5.9269, 133.9977) -> (1.6637, 121.6278) projected
  line L4 (-51.7602, 133.9977) -> (-5.9269, 133.9977) projected
  line L5 (-59.0677, 121.3501) -> (-51.7602, 133.9977) projected
  line L6 (0.0762, -0.0762) -> (0.0762, 121.1795) projected
  line L7 (-57.4802, -0.0762) -> (0.0762, -0.0762) projected
  line L8 (-57.4802, 120.9244) -> (-57.4802, -0.0762) projected
  line L9 (-50.844, 132.4102) -> (-57.4802, 120.9244) projected
  line L10 (-6.8154, 132.4102) -> (-50.844, 132.4102) projected
  line L11 (0.0762, 121.1795) -> (-6.8154, 132.4102) projected
  point P0 (0, 0)
extrude "Extrusion2" add sketch "Sketch2" along normal blind 1.5875 contours L0 L5 L4 L3 L2 L1 | L7 L8 L9 L10 L11 L6
extrude "Extrusion3" add sketch "Sketch1" along normal up to surface (6.35 mm away) contours A260 | A261 | A262 | A263
sketch "Sketch3" plane through (-39.37, 6.35, 114.808) normal (0, 1, 0) x (1, 0, 0)
  circle A0 centre (0, 95.25) radius 1.905 projected
  circle A1 centre (0, 95.25) radius 1.27
  circle A2 centre (21.336, 95.25) radius 1.905 projected
  circle A3 centre (0, 0) radius 1.905 projected
  circle A4 centre (21.336, 0) radius 1.905 projected
  circle A5 centre (0, 0) radius 1.905 projected
  circle A6 centre (0, 0) radius 1.27
  circle A7 centre (21.336, 0) radius 1.905 projected
  circle A8 centre (21.336, 0) radius 1.27
  circle A9 centre (21.336, 95.25) radius 1.27
  point P0 (39.37, 114.808)
  dimension "d9" = 2.54
extrude "Extrusion4" cut sketch "Sketch3" against normal up to surface (6.35 mm away) contours A1 | A6 | A8 | A9
fillet "Fillet1" radius 0.7937 4 edges at (-37.465, 0, 114.808) (-37.465, 0, 19.558) (-16.129, 0, 19.558) (-16.129, 0, 114.808)
sketch "Sketch5" plane through (0, 6.35, 0) normal (0, 1, 0) x (1, 0, 0)
  line L0 (1.6637, 1.6637) -> (-59.0677, 1.6637) projected
  line L1 (-40.4495, 0) -> (-16.9545, 0)
  line L2 (-16.9545, 0) -> (-16.9545, 1.6637)
  line L3 (-16.9545, 1.6637) -> (-40.4495, 1.6637)
  line L4 (-40.4495, 1.6637) -> (-40.4495, 0)
  line L5 (0.0762, 0.0762) -> (0.0762, -121.1795) projected
  line L6 (-57.4802, -120.9244) -> (-57.4802, 0.0762) projected
  point P0 (0, 0)
  dimension "d13" = 23.495
  dimension "d14" = 17.0307
  dimension "d15" = 17.0307
extrude "Extrusion5" cut sketch "Sketch5" against normal blind 2.8956
equation "\"d10\" = d9"
equation "\"d14\" = d15"
properties part number "CaseBottomV2"
